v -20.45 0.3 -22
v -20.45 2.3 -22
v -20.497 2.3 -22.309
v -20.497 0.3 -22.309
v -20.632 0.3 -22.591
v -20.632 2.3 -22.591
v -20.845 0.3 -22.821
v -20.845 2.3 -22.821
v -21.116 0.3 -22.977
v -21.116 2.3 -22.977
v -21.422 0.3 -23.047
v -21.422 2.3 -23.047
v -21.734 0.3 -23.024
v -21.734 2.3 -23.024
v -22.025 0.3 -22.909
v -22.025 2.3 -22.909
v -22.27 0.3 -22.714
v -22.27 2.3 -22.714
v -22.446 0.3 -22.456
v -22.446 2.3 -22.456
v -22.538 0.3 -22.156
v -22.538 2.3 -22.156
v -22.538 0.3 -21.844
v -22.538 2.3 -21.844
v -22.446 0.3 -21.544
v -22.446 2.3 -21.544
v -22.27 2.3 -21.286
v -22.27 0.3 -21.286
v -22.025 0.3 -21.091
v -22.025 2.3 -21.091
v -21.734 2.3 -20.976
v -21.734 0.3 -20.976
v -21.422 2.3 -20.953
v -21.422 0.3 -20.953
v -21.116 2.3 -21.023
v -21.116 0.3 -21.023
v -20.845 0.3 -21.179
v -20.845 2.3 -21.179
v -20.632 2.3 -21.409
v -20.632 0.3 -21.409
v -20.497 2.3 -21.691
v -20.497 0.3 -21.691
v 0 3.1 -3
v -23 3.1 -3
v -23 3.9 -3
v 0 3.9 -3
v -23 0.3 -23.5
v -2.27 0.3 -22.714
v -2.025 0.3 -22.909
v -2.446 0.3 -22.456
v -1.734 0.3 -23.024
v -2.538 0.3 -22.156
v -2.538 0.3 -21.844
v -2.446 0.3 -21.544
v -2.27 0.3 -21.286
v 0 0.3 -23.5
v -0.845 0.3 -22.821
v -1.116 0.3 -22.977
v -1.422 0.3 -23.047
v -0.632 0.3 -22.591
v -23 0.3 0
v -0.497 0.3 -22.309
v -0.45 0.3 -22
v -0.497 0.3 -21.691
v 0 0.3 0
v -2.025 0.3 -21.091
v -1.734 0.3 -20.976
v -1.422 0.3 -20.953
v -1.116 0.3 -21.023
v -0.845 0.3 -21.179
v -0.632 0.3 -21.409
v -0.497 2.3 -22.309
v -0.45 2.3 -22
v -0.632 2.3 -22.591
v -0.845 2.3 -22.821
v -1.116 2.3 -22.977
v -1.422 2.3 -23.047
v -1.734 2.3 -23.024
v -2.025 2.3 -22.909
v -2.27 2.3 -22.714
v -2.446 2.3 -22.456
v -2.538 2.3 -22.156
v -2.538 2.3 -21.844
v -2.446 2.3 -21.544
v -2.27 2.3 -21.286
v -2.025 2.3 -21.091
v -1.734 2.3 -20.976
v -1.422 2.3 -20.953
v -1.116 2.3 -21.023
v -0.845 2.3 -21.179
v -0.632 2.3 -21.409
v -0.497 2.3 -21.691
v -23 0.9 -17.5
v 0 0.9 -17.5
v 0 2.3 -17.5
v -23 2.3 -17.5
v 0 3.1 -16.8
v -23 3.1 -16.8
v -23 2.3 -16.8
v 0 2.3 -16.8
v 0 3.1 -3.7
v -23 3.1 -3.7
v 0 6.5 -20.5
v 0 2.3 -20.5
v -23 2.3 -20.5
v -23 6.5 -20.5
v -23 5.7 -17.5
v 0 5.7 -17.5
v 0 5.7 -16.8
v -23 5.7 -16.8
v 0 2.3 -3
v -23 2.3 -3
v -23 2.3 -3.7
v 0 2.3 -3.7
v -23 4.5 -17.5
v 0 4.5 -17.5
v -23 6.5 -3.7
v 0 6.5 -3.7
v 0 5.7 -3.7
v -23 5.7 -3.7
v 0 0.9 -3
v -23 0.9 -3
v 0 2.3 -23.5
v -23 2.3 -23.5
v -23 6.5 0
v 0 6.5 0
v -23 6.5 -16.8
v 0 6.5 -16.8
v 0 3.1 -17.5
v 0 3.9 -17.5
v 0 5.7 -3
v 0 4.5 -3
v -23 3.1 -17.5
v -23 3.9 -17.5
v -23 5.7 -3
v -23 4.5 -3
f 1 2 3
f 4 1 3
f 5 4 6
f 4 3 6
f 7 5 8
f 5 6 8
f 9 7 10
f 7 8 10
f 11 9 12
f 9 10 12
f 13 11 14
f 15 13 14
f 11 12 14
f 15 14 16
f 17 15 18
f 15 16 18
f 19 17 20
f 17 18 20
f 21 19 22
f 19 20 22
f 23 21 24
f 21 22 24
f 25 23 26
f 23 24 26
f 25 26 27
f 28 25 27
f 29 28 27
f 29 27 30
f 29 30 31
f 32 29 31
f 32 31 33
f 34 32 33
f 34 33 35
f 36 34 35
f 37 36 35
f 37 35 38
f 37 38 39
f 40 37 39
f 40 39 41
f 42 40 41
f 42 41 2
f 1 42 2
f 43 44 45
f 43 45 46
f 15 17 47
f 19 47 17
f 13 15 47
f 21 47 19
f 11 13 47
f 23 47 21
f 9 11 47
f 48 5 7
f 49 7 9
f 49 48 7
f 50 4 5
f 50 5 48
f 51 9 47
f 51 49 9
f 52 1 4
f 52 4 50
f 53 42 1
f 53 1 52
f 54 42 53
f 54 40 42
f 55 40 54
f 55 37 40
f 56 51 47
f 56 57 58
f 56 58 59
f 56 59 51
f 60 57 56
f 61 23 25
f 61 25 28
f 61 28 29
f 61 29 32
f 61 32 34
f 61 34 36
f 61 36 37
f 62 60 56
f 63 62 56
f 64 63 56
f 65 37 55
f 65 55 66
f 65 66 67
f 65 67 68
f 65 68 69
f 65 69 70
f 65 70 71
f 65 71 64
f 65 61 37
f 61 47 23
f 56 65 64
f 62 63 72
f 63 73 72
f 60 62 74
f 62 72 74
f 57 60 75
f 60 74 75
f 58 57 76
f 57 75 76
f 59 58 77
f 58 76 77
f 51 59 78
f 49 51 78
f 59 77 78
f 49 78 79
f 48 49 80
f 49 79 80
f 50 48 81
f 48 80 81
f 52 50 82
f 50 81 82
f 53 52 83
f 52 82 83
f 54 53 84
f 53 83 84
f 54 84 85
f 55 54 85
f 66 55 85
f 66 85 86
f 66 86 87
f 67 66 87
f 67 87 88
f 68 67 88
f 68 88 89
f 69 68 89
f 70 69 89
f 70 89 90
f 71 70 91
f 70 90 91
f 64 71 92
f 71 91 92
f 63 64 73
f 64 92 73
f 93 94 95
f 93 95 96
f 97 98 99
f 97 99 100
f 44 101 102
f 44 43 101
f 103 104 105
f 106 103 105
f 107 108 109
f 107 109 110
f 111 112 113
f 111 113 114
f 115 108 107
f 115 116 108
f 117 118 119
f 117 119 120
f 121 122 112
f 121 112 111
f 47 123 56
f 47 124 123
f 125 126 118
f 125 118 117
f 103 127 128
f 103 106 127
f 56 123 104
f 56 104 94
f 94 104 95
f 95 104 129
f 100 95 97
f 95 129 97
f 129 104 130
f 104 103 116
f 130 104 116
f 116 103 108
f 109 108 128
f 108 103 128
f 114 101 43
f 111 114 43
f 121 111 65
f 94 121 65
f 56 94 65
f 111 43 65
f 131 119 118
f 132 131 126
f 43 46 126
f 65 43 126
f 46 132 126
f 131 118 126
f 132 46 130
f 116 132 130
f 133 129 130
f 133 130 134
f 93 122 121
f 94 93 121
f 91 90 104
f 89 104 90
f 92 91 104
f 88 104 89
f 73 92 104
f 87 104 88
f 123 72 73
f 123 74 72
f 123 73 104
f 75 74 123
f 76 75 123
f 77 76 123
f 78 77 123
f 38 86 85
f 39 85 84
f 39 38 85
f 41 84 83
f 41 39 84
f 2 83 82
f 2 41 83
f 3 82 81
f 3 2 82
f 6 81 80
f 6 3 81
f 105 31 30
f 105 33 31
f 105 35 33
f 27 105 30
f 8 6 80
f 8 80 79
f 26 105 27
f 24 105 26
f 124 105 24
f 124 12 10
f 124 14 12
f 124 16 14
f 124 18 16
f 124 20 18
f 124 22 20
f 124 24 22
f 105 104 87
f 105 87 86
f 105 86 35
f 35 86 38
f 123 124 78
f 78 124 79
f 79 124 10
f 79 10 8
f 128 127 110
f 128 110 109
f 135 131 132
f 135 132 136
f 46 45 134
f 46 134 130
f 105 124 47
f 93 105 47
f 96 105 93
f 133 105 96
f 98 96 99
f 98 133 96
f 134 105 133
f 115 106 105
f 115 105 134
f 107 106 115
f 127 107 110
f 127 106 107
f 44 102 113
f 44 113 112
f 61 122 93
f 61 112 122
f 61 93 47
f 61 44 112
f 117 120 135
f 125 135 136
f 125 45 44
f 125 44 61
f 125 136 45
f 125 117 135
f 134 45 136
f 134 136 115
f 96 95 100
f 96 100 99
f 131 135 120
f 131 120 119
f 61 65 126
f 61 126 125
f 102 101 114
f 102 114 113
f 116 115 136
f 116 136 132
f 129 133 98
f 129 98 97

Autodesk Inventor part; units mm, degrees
ref_plane "YZ Plane" through (0, 0, 0) normal (1, 0, 0) x (0, 1, 0)
ref_plane "XZ Plane" through (0, 0, 0) normal (0, 1, 0) x (-1, 0, 0)
ref_plane "XY Plane" through (0, 0, 0) normal (0, 0, 1) x (1, 0, 0)
sketch "Sketch1" plane through (0, 0, 0) normal (0, 1, 0) x (-1, 0, 0)
  line L0 (0, 0) -> (23, 0)
  line L1 (23, 0) -> (23, -3)
  line L2 (23, -3) -> (0, -3)
  line L3 (0, -3) -> (0, 0)
  line L4 (23, -3) -> (0, -3)
  line L5 (0, -3) -> (0, -17.5)
  line L6 (0, -17.5) -> (23, -17.5)
  line L7 (23, -17.5) -> (23, -3)
  line L8 (23, -17.5) -> (0, -17.5)
  line L9 (0, -17.5) -> (0, -20.5)
  line L10 (0, -20.5) -> (23, -20.5)
  line L11 (23, -20.5) -> (23, -17.5)
  dimension "d0" = 23
  dimension "d1" = 3
  dimension "d2" = 14.5
  dimension "d3" = 3
extrude "Extrusion1" add sketch "Sketch1" along normal blind 5 contours L0 L1 L2 L3 | L6 L11 L10 L9
sketch "Sketch2" plane through (0, 0, -3) normal (0, 0, -1) x (-1, 0, 0)
  line L0 (0, 0) -> (0, 5) projected
  line L1 (23, 0) -> (23, 5) projected
  line L2 (0, 1.8) -> (23, 1.8)
  line L3 (23, 1.8) -> (23, 1)
  line L4 (23, 1) -> (0, 1)
  line L5 (0, 1) -> (0, 1.8)
  line L6 (0, 0) -> (23, 0) projected
  point P0 (0, 1)
  dimension "d6" = 0.8
  dimension "d7" = 1
extrude "Extrusion2" add sketch "Sketch2" along normal up to surface (14.5 mm away) contours L0 L2 L1 L4
sketch "Sketch3" plane through (-23, 5, -17.5) normal (0, 0, 1) x (1, 0, 0)
  line L0 (0, -5) -> (0, 0) projected
  line L1 (23, -5) -> (23, 0) projected
  line L2 (0, -1.9) -> (23, -1.9)
  line L3 (23, -1.9) -> (23, -2.7)
  line L4 (23, -2.7) -> (0, -2.7)
  line L5 (0, -2.7) -> (0, -1.9)
  line L6 (0, -3.2) -> (23, -3.2) projected
  point P0 (0, -2.7)
  dimension "d10" = 0.8
  dimension "d11" = 0.5
extrude "Extrusion3" add sketch "Sketch3" along normal blind 0.7 contours L0 L2 L1 L4
sketch "Sketch4" plane through (0, 5, -3) normal (0, 0, -1) x (-1, 0, 0)
  line L0 (0, -2.7) -> (0, -1.9) projected
  line L1 (0, -1.9) -> (23, -1.9) projected
  line L2 (23, -1.9) -> (23, -2.7) projected
  line L3 (23, -2.7) -> (0, -2.7) projected
  point P0 (0, -5)
extrude "Extrusion4" add sketch "Sketch4" along normal blind 0.7
sketch "Sketch5" plane through (0, 5, 0) normal (0, 1, 0) x (1, 0, 0)
  line L0 (-23, 0) -> (0, 0) projected
  line L1 (0, 0) -> (0, 3) projected
  line L2 (0, 3) -> (-23, 3) projected
  line L3 (-23, 3) -> (-23, 0) projected
  line L4 (-23, 17.5) -> (0, 17.5) projected
  line L5 (0, 17.5) -> (0, 20.5) projected
  line L6 (0, 20.5) -> (-23, 20.5) projected
  line L7 (-23, 20.5) -> (-23, 17.5) projected
extrude "Extrusion5" add sketch "Sketch5" along normal blind 1.5
sketch "Sketch6" plane through (0, 3.1, -3) normal (0, 0, -1) x (-1, 0, 0)
  line L0 (0, 3.4) -> (23, 3.4) projected
  line L1 (23, 0) -> (23, 3.4) projected
  line L2 (0, 3.4) -> (23, 3.4)
  line L3 (23, 3.4) -> (23, 2.6)
  line L4 (23, 2.6) -> (0, 2.6)
  line L5 (0, 2.6) -> (0, 3.4)
  point P0 (0, -3.1)
  dimension "d18" = 0.8
extrude "Extrusion6" add sketch "Sketch6" along normal blind 0.7
sketch "Sketch7" plane through (-23, 3.1, -17.5) normal (0, 0, 1) x (1, 0, 0)
  line L0 (23, 2.6) -> (0, 2.6) projected
  line L1 (0, 2.6) -> (0, 3.4) projected
  line L2 (0, 3.4) -> (23, 3.4) projected
  line L3 (23, 3.4) -> (23, 2.6) projected
  point P0 (23, -3.1)
extrude "Extrusion7" add sketch "Sketch7" along normal blind 0.7
sketch "Sketch8" plane through (-23, 3.1, -17.5) normal (0, 0, 1) x (1, 0, 0)
  line L0 (23, 0) -> (23, 2.6) projected
  line L1 (0, 0) -> (0, 2.6) projected
  line L2 (23, 2.1) -> (0, 2.1)
  line L3 (0, 2.1) -> (0, 1.3)
  line L4 (0, 1.3) -> (23, 1.3)
  line L5 (23, 1.3) -> (23, 2.1)
  line L6 (23, 3.4) -> (0, 3.4) projected
  point P0 (23, -3.1)
  point P1 (0, 2.1)
  dimension "d23" = 0.8
  dimension "d24" = 1.3
extrude "Extrusion8" add sketch "Sketch8" along normal up to surface (14.5 mm away)
sketch "Sketch9" plane through (0, 0, 0) normal (0, -1, 0) x (1, 0, 0)
  line L0 (-23, -17.5) -> (0, -17.5) projected
  line L1 (-23, -20.5) -> (-23, -17.5) projected
  line L2 (0, -20.5) -> (-23, -20.5) projected
  line L3 (0, -17.5) -> (0, -20.5) projected
  line L4 (-23, 0) -> (0, 0) projected
  line L5 (-23, -3) -> (-23, 0) projected
  line L6 (0, -3) -> (-23, -3) projected
  line L7 (0, 0) -> (0, -3) projected
extrude "Extrusion9" cut sketch "Sketch9" against normal blind 0.3
sketch "Sketch10" plane through (0, 6.5, -20.5) normal (0, 0, -1) x (-1, 0, 0)
  line L0 (23, -6.2) -> (0, -6.2) projected
  line L1 (0, -6.2) -> (3, -6.2)
  line L2 (3, -6.2) -> (3, -4.2)
  line L3 (3, -4.2) -> (0, -4.2)
  line L4 (0, -4.2) -> (0, -6.2)
  point P0 (0, -6.5)
  dimension "d29" = 3
  dimension "d30" = 2
extrude "Extrusion10" add sketch "Sketch10" along normal blind 3
sketch "Sketch11" plane through (0, 6.5, -20.5) normal (0, 0, -1) x (-1, 0, 0)
  line L0 (23, -6.2) -> (0, -6.2) projected
  line L1 (23, -6.2) -> (20, -6.2)
  line L2 (20, -6.2) -> (20, -4.2)
  line L3 (20, -4.2) -> (23, -4.2)
  line L4 (23, -4.2) -> (23, -6.2)
  point P0 (0, -6.5)
  dimension "d33" = 3
  dimension "d34" = 2
extrude "Extrusion11" add sketch "Sketch11" along normal blind 3
sketch "Sketch12" plane through (-3, 2.3, -20.5) normal (0, 1, 0) x (1, 0, 0)
  circle A0 centre (1.5, 1.5) radius 1.05
  line L0 (3, 0) -> (3, 3) projected
  line L1 (0, 3) -> (3, 3) projected
  circle A1 centre (-18.5, 1.5) radius 1.05
  line L2 (-17, 0) -> (-17, 3) projected
  line L3 (-20, 3) -> (-17, 3) projected
  point P0 (3, -20.5)
  point P1 (1.5, 3)
  point P2 (-17, 1.5)
  point P3 (-18.5, 3)
  dimension "d37" = 2.1
  dimension "d38" = 1.5
  dimension "d39" = 1.5
  dimension "d40" = 2.1
  dimension "d41" = 1.5
  dimension "d42" = 1.5
extrude "Extrusion12" cut sketch "Sketch12" against normal blind 2
sketch "Sketch13" plane through (-20, 0.3, -20.5) normal (1, 0, 0) x (0, 0, -1)
  line L0 (-3, 4.1) -> (-17.5, 4.1) projected
  line L1 (-3, 2.8) -> (-3, 4.1) projected
  line L2 (-3, 2.8) -> (-3.7, 2.8) projected
  line L3 (-3.7, 2) -> (-3.7, 2.8) projected
  line L4 (-3, 2) -> (-3.7, 2) projected
  line L5 (-3, 1.5) -> (-3, 2) projected
  line L6 (-17.5, 1.5) -> (-3, 1.5) projected
  line L7 (-17.5, 1.5) -> (-17.5, 2) projected
  line L8 (-17.5, 2) -> (-16.8, 2) projected
  line L9 (-16.8, 2.8) -> (-16.8, 2) projected
  line L10 (-17.5, 2.8) -> (-16.8, 2.8) projected
  line L11 (-17.5, 2.8) -> (-17.5, 4.1) projected
  line L12 (-20.5, 0) -> (-17.5, 0) projected
  line L13 (-17.5, 0) -> (-17.5, 0.7) projected
  line L14 (-17.5, 0.7) -> (-3, 0.7) projected
  line L15 (-3, 0) -> (-3, 0.7) projected
  line L16 (-3, 0) -> (3, 0) projected
  line L17 (3, 2) -> (3, 0) projected
  line L18 (0, 2) -> (3, 2) projected
  line L19 (0, 2) -> (0, 6.2) projected
  line L20 (0, 6.2) -> (-3.7, 6.2) projected
  line L21 (-3.7, 5.4) -> (-3.7, 6.2) projected
  line L22 (-3, 5.4) -> (-3.7, 5.4) projected
  line L23 (-3, 4.9) -> (-3, 5.4) projected
  line L24 (-3, 4.9) -> (-17.5, 4.9) projected
  line L25 (-17.5, 4.9) -> (-17.5, 5.4) projected
  line L26 (-17.5, 5.4) -> (-16.8, 5.4) projected
  line L27 (-16.8, 6.2) -> (-16.8, 5.4) projected
  line L28 (-20.5, 6.2) -> (-16.8, 6.2) projected
  line L29 (-20.5, 0) -> (-20.5, 6.2) projected
  line L30 (0, 0) -> (0, 2) projected
  line L31 (0, 0) -> (3, 0) projected
  line L32 (3, 2) -> (3, 0) projected
  line L33 (0, 2) -> (3, 2) projected
  point P0 (-20.5, -0.3)
extrude "Extrusion13" add sketch "Sketch13" along normal up to surface (17 mm away) contours L30 L18 L17 L16
sketch "Sketch14" plane through (-23, 1, -3) normal (0, -1, 0) x (1, 0, 0)
  line L0 (23, -14.5) -> (0, -14.5) projected
  line L1 (23, 0) -> (23, -14.5) projected
  line L2 (0, 0) -> (23, 0) projected
  line L3 (0, 0) -> (0, -14.5) projected
  point P0 (23, 3)
extrude "Extrusion14" cut sketch "Sketch14" against normal blind 0.8
sketch "Sketch15" plane through (0, 0.3, 0) normal (0, -1, 0) x (1, 0, 0)
  point P0 (0, 0)
sketch "Sketch16" plane through (0, 0.3, 0) normal (0, -1, 0) x (1, 0, 0)
  circle A0 centre (-21.5, -22) radius 1.05 projected
  circle A1 centre (-1.5, -22) radius 1.05 projected
  line L0 (0, -17.5) -> (0, -23.5) projected
  line L1 (-23, -17.5) -> (0, -17.5) projected
  line L2 (-23, -23.5) -> (-23, -17.5) projected
  line L3 (0, -23.5) -> (-23, -23.5) projected
  line L4 (-23, -3) -> (0, -3) projected
  line L5 (-23, -17.5) -> (-23, -3) projected
  line L6 (0, -17.5) -> (-23, -17.5) projected
  line L7 (0, -17.5) -> (0, -3) projected
  point P0 (0, 0)
extrude "Extrusion15" add sketch "Sketch16" against normal blind 0.6 contours L1 L5 L4 L7
sketch "Sketch17" plane through (-23, 4.4, -17.5) normal (0, -1, 0) x (1, 0, 0)
  line L0 (0, 14.5) -> (23, 14.5) projected
  line L1 (0, 0) -> (0, 14.5) projected
  line L2 (23, 0) -> (0, 0) projected
  line L3 (23, 0) -> (23, 14.5) projected
  point P0 (23, 17.5)
extrude "Extrusion16" add sketch "Sketch17" along normal blind 0.5
sketch "Sketch18" plane through (-23, 5.2, -17.5) normal (0, 1, 0) x (1, 0, 0)
  line L0 (23, -14.5) -> (0, -14.5) projected
  line L1 (23, 0) -> (23, -14.5) projected
  line L2 (0, 0) -> (23, 0) projected
  line L3 (0, 0) -> (0, -14.5) projected
  point P0 (23, -17.5)
extrude "Extrusion17" cut sketch "Sketch18" against normal blind 0.7
properties part number "drvholder" material "Tworzywo sztuczne PET"
